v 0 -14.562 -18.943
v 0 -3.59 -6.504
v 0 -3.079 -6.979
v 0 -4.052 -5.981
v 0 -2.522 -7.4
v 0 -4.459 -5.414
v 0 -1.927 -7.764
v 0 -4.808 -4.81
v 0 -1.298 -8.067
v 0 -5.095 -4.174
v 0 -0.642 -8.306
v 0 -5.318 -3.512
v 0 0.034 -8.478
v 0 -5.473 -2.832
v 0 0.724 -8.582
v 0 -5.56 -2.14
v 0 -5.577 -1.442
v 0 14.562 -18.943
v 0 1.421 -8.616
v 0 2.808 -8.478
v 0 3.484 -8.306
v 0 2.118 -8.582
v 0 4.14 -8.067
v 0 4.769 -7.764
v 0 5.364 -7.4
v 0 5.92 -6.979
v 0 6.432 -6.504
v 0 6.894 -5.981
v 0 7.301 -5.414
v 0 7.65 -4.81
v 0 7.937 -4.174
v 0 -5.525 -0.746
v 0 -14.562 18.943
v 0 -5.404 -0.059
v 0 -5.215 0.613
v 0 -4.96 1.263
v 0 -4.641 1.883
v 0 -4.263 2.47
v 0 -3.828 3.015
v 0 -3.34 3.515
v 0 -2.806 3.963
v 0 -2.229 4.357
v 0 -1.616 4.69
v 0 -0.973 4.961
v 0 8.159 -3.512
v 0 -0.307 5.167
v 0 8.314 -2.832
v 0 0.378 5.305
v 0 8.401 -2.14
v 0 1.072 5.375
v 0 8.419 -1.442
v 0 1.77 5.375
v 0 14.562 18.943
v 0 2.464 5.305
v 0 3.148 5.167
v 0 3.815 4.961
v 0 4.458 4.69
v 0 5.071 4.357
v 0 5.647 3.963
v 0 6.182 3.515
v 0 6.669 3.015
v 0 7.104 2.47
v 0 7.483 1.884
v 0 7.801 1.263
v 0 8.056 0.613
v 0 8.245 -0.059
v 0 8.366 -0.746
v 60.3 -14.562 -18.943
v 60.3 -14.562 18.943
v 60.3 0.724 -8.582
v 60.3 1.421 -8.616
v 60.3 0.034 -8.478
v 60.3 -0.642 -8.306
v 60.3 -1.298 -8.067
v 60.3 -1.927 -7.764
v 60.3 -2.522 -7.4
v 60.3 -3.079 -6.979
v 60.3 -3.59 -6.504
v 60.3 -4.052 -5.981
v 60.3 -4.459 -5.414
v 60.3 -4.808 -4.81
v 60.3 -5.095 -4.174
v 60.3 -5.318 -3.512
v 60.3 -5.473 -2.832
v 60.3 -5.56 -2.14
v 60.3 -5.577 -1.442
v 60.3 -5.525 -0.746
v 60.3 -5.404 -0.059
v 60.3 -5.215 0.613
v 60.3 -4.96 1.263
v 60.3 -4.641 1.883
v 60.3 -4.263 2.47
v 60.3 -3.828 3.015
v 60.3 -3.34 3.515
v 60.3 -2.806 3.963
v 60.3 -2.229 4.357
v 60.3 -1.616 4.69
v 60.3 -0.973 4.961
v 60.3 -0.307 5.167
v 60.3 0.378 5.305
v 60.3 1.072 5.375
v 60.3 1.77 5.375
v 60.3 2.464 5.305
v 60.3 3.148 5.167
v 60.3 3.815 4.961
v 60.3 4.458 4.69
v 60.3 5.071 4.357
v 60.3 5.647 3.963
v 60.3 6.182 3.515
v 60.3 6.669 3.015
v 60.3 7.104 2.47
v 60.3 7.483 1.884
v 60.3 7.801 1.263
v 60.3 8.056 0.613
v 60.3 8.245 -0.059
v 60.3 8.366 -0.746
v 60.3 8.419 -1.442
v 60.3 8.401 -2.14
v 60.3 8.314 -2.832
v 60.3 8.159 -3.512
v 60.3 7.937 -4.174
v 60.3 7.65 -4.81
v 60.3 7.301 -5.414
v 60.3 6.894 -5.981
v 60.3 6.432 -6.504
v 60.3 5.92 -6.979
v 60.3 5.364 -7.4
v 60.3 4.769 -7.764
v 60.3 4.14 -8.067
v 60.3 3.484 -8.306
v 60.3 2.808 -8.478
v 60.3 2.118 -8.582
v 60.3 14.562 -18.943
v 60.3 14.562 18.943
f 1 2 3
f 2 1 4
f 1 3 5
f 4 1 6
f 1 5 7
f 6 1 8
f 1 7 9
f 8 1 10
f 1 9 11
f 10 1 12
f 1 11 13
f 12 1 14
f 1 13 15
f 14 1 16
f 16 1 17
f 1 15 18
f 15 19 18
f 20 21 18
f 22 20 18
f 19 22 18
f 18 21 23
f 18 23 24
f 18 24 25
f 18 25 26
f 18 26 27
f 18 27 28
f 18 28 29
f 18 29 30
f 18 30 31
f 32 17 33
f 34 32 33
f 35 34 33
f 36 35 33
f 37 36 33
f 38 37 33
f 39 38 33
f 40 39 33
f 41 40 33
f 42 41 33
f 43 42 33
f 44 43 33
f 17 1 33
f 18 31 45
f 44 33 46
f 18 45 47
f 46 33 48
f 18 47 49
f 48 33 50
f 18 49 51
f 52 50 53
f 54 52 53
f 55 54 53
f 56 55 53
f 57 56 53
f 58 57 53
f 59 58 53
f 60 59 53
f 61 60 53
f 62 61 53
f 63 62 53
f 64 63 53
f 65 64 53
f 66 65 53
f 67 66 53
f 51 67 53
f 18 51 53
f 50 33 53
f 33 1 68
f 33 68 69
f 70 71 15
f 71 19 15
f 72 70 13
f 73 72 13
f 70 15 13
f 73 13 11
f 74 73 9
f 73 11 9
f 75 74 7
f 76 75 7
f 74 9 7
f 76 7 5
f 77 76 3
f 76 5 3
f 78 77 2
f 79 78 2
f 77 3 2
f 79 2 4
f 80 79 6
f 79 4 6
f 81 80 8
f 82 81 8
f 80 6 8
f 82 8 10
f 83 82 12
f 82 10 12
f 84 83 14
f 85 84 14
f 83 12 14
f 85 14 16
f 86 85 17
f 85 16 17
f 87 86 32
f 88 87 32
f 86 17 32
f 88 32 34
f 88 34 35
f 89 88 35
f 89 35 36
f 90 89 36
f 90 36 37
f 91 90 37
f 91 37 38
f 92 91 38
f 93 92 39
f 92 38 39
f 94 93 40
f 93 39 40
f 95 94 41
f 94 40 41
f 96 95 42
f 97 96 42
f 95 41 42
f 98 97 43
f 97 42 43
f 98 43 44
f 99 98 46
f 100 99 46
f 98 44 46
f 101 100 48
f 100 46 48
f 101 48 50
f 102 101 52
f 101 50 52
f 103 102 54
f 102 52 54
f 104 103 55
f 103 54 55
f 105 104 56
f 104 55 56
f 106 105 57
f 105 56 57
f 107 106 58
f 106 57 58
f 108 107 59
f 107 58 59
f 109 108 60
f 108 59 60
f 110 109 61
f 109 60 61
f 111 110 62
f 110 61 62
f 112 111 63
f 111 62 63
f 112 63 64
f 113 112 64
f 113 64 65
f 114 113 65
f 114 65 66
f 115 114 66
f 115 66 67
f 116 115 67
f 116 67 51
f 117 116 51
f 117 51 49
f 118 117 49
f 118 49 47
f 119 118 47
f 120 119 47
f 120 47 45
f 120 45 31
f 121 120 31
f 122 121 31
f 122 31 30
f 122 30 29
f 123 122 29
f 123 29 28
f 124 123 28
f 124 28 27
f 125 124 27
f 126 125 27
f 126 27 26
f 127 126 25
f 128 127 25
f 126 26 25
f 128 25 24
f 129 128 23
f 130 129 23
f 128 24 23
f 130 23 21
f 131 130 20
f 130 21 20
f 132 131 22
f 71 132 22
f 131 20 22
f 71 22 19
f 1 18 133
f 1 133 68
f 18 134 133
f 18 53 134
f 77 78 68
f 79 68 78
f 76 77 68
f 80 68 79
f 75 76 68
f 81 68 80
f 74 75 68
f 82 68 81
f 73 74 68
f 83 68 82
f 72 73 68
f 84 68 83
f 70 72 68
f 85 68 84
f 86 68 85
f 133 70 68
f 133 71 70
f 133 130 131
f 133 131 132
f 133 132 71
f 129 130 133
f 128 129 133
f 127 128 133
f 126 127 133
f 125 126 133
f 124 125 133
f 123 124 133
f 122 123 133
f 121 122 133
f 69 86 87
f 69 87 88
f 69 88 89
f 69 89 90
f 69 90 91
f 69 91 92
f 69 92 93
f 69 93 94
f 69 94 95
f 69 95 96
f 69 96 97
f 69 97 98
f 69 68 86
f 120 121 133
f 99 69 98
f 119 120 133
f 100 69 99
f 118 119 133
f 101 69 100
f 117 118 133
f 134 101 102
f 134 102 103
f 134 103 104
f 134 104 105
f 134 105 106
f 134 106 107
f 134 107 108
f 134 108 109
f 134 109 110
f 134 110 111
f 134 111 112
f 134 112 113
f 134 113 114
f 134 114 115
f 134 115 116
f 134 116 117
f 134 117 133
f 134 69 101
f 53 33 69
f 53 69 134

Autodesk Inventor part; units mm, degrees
ref_plane "YZ Plane" through (0, 0, 0) normal (1, 0, 0) x (0, 1, 0)
ref_plane "XZ Plane" through (0, 0, 0) normal (0, 1, 0) x (-1, 0, 0)
ref_plane "XY Plane" through (0, 0, 0) normal (0, 0, 1) x (1, 0, 0)
sketch "Sketch1" plane through (0, 0, 0) normal (1, 0, 0) x (0, 1, 0)
  line L0 (-14.5623, 18.9434) -> (14.5623, 18.9434)
  line L1 (14.5623, 18.9434) -> (14.5623, -18.9434)
  line L2 (14.5623, -18.9434) -> (-14.5623, -18.9434)
  line L3 (-14.5623, -18.9434) -> (-14.5623, 18.9434)
  line L4 (-14.5623, 18.9434) -> (14.5623, -18.9434) construction
  line L5 (14.5623, 18.9434) -> (-14.5623, -18.9434) construction
  point P0 (0, 0)
extrude "Extrusion1" add sketch "Sketch1" along normal blind 60.3
sketch "Sketch2" plane through (60.3, 0, 0) normal (1, 0, 0) x (0, 0, -1)
  point P0 (0, 0)
  point P1 (1.6165, 1.4208)
hole "Hole1" at (60.3, 1.4208, -1.6165) direction (-1, 0, 0) diameter 14 end through all
properties part number "Pieza para tornillos"
